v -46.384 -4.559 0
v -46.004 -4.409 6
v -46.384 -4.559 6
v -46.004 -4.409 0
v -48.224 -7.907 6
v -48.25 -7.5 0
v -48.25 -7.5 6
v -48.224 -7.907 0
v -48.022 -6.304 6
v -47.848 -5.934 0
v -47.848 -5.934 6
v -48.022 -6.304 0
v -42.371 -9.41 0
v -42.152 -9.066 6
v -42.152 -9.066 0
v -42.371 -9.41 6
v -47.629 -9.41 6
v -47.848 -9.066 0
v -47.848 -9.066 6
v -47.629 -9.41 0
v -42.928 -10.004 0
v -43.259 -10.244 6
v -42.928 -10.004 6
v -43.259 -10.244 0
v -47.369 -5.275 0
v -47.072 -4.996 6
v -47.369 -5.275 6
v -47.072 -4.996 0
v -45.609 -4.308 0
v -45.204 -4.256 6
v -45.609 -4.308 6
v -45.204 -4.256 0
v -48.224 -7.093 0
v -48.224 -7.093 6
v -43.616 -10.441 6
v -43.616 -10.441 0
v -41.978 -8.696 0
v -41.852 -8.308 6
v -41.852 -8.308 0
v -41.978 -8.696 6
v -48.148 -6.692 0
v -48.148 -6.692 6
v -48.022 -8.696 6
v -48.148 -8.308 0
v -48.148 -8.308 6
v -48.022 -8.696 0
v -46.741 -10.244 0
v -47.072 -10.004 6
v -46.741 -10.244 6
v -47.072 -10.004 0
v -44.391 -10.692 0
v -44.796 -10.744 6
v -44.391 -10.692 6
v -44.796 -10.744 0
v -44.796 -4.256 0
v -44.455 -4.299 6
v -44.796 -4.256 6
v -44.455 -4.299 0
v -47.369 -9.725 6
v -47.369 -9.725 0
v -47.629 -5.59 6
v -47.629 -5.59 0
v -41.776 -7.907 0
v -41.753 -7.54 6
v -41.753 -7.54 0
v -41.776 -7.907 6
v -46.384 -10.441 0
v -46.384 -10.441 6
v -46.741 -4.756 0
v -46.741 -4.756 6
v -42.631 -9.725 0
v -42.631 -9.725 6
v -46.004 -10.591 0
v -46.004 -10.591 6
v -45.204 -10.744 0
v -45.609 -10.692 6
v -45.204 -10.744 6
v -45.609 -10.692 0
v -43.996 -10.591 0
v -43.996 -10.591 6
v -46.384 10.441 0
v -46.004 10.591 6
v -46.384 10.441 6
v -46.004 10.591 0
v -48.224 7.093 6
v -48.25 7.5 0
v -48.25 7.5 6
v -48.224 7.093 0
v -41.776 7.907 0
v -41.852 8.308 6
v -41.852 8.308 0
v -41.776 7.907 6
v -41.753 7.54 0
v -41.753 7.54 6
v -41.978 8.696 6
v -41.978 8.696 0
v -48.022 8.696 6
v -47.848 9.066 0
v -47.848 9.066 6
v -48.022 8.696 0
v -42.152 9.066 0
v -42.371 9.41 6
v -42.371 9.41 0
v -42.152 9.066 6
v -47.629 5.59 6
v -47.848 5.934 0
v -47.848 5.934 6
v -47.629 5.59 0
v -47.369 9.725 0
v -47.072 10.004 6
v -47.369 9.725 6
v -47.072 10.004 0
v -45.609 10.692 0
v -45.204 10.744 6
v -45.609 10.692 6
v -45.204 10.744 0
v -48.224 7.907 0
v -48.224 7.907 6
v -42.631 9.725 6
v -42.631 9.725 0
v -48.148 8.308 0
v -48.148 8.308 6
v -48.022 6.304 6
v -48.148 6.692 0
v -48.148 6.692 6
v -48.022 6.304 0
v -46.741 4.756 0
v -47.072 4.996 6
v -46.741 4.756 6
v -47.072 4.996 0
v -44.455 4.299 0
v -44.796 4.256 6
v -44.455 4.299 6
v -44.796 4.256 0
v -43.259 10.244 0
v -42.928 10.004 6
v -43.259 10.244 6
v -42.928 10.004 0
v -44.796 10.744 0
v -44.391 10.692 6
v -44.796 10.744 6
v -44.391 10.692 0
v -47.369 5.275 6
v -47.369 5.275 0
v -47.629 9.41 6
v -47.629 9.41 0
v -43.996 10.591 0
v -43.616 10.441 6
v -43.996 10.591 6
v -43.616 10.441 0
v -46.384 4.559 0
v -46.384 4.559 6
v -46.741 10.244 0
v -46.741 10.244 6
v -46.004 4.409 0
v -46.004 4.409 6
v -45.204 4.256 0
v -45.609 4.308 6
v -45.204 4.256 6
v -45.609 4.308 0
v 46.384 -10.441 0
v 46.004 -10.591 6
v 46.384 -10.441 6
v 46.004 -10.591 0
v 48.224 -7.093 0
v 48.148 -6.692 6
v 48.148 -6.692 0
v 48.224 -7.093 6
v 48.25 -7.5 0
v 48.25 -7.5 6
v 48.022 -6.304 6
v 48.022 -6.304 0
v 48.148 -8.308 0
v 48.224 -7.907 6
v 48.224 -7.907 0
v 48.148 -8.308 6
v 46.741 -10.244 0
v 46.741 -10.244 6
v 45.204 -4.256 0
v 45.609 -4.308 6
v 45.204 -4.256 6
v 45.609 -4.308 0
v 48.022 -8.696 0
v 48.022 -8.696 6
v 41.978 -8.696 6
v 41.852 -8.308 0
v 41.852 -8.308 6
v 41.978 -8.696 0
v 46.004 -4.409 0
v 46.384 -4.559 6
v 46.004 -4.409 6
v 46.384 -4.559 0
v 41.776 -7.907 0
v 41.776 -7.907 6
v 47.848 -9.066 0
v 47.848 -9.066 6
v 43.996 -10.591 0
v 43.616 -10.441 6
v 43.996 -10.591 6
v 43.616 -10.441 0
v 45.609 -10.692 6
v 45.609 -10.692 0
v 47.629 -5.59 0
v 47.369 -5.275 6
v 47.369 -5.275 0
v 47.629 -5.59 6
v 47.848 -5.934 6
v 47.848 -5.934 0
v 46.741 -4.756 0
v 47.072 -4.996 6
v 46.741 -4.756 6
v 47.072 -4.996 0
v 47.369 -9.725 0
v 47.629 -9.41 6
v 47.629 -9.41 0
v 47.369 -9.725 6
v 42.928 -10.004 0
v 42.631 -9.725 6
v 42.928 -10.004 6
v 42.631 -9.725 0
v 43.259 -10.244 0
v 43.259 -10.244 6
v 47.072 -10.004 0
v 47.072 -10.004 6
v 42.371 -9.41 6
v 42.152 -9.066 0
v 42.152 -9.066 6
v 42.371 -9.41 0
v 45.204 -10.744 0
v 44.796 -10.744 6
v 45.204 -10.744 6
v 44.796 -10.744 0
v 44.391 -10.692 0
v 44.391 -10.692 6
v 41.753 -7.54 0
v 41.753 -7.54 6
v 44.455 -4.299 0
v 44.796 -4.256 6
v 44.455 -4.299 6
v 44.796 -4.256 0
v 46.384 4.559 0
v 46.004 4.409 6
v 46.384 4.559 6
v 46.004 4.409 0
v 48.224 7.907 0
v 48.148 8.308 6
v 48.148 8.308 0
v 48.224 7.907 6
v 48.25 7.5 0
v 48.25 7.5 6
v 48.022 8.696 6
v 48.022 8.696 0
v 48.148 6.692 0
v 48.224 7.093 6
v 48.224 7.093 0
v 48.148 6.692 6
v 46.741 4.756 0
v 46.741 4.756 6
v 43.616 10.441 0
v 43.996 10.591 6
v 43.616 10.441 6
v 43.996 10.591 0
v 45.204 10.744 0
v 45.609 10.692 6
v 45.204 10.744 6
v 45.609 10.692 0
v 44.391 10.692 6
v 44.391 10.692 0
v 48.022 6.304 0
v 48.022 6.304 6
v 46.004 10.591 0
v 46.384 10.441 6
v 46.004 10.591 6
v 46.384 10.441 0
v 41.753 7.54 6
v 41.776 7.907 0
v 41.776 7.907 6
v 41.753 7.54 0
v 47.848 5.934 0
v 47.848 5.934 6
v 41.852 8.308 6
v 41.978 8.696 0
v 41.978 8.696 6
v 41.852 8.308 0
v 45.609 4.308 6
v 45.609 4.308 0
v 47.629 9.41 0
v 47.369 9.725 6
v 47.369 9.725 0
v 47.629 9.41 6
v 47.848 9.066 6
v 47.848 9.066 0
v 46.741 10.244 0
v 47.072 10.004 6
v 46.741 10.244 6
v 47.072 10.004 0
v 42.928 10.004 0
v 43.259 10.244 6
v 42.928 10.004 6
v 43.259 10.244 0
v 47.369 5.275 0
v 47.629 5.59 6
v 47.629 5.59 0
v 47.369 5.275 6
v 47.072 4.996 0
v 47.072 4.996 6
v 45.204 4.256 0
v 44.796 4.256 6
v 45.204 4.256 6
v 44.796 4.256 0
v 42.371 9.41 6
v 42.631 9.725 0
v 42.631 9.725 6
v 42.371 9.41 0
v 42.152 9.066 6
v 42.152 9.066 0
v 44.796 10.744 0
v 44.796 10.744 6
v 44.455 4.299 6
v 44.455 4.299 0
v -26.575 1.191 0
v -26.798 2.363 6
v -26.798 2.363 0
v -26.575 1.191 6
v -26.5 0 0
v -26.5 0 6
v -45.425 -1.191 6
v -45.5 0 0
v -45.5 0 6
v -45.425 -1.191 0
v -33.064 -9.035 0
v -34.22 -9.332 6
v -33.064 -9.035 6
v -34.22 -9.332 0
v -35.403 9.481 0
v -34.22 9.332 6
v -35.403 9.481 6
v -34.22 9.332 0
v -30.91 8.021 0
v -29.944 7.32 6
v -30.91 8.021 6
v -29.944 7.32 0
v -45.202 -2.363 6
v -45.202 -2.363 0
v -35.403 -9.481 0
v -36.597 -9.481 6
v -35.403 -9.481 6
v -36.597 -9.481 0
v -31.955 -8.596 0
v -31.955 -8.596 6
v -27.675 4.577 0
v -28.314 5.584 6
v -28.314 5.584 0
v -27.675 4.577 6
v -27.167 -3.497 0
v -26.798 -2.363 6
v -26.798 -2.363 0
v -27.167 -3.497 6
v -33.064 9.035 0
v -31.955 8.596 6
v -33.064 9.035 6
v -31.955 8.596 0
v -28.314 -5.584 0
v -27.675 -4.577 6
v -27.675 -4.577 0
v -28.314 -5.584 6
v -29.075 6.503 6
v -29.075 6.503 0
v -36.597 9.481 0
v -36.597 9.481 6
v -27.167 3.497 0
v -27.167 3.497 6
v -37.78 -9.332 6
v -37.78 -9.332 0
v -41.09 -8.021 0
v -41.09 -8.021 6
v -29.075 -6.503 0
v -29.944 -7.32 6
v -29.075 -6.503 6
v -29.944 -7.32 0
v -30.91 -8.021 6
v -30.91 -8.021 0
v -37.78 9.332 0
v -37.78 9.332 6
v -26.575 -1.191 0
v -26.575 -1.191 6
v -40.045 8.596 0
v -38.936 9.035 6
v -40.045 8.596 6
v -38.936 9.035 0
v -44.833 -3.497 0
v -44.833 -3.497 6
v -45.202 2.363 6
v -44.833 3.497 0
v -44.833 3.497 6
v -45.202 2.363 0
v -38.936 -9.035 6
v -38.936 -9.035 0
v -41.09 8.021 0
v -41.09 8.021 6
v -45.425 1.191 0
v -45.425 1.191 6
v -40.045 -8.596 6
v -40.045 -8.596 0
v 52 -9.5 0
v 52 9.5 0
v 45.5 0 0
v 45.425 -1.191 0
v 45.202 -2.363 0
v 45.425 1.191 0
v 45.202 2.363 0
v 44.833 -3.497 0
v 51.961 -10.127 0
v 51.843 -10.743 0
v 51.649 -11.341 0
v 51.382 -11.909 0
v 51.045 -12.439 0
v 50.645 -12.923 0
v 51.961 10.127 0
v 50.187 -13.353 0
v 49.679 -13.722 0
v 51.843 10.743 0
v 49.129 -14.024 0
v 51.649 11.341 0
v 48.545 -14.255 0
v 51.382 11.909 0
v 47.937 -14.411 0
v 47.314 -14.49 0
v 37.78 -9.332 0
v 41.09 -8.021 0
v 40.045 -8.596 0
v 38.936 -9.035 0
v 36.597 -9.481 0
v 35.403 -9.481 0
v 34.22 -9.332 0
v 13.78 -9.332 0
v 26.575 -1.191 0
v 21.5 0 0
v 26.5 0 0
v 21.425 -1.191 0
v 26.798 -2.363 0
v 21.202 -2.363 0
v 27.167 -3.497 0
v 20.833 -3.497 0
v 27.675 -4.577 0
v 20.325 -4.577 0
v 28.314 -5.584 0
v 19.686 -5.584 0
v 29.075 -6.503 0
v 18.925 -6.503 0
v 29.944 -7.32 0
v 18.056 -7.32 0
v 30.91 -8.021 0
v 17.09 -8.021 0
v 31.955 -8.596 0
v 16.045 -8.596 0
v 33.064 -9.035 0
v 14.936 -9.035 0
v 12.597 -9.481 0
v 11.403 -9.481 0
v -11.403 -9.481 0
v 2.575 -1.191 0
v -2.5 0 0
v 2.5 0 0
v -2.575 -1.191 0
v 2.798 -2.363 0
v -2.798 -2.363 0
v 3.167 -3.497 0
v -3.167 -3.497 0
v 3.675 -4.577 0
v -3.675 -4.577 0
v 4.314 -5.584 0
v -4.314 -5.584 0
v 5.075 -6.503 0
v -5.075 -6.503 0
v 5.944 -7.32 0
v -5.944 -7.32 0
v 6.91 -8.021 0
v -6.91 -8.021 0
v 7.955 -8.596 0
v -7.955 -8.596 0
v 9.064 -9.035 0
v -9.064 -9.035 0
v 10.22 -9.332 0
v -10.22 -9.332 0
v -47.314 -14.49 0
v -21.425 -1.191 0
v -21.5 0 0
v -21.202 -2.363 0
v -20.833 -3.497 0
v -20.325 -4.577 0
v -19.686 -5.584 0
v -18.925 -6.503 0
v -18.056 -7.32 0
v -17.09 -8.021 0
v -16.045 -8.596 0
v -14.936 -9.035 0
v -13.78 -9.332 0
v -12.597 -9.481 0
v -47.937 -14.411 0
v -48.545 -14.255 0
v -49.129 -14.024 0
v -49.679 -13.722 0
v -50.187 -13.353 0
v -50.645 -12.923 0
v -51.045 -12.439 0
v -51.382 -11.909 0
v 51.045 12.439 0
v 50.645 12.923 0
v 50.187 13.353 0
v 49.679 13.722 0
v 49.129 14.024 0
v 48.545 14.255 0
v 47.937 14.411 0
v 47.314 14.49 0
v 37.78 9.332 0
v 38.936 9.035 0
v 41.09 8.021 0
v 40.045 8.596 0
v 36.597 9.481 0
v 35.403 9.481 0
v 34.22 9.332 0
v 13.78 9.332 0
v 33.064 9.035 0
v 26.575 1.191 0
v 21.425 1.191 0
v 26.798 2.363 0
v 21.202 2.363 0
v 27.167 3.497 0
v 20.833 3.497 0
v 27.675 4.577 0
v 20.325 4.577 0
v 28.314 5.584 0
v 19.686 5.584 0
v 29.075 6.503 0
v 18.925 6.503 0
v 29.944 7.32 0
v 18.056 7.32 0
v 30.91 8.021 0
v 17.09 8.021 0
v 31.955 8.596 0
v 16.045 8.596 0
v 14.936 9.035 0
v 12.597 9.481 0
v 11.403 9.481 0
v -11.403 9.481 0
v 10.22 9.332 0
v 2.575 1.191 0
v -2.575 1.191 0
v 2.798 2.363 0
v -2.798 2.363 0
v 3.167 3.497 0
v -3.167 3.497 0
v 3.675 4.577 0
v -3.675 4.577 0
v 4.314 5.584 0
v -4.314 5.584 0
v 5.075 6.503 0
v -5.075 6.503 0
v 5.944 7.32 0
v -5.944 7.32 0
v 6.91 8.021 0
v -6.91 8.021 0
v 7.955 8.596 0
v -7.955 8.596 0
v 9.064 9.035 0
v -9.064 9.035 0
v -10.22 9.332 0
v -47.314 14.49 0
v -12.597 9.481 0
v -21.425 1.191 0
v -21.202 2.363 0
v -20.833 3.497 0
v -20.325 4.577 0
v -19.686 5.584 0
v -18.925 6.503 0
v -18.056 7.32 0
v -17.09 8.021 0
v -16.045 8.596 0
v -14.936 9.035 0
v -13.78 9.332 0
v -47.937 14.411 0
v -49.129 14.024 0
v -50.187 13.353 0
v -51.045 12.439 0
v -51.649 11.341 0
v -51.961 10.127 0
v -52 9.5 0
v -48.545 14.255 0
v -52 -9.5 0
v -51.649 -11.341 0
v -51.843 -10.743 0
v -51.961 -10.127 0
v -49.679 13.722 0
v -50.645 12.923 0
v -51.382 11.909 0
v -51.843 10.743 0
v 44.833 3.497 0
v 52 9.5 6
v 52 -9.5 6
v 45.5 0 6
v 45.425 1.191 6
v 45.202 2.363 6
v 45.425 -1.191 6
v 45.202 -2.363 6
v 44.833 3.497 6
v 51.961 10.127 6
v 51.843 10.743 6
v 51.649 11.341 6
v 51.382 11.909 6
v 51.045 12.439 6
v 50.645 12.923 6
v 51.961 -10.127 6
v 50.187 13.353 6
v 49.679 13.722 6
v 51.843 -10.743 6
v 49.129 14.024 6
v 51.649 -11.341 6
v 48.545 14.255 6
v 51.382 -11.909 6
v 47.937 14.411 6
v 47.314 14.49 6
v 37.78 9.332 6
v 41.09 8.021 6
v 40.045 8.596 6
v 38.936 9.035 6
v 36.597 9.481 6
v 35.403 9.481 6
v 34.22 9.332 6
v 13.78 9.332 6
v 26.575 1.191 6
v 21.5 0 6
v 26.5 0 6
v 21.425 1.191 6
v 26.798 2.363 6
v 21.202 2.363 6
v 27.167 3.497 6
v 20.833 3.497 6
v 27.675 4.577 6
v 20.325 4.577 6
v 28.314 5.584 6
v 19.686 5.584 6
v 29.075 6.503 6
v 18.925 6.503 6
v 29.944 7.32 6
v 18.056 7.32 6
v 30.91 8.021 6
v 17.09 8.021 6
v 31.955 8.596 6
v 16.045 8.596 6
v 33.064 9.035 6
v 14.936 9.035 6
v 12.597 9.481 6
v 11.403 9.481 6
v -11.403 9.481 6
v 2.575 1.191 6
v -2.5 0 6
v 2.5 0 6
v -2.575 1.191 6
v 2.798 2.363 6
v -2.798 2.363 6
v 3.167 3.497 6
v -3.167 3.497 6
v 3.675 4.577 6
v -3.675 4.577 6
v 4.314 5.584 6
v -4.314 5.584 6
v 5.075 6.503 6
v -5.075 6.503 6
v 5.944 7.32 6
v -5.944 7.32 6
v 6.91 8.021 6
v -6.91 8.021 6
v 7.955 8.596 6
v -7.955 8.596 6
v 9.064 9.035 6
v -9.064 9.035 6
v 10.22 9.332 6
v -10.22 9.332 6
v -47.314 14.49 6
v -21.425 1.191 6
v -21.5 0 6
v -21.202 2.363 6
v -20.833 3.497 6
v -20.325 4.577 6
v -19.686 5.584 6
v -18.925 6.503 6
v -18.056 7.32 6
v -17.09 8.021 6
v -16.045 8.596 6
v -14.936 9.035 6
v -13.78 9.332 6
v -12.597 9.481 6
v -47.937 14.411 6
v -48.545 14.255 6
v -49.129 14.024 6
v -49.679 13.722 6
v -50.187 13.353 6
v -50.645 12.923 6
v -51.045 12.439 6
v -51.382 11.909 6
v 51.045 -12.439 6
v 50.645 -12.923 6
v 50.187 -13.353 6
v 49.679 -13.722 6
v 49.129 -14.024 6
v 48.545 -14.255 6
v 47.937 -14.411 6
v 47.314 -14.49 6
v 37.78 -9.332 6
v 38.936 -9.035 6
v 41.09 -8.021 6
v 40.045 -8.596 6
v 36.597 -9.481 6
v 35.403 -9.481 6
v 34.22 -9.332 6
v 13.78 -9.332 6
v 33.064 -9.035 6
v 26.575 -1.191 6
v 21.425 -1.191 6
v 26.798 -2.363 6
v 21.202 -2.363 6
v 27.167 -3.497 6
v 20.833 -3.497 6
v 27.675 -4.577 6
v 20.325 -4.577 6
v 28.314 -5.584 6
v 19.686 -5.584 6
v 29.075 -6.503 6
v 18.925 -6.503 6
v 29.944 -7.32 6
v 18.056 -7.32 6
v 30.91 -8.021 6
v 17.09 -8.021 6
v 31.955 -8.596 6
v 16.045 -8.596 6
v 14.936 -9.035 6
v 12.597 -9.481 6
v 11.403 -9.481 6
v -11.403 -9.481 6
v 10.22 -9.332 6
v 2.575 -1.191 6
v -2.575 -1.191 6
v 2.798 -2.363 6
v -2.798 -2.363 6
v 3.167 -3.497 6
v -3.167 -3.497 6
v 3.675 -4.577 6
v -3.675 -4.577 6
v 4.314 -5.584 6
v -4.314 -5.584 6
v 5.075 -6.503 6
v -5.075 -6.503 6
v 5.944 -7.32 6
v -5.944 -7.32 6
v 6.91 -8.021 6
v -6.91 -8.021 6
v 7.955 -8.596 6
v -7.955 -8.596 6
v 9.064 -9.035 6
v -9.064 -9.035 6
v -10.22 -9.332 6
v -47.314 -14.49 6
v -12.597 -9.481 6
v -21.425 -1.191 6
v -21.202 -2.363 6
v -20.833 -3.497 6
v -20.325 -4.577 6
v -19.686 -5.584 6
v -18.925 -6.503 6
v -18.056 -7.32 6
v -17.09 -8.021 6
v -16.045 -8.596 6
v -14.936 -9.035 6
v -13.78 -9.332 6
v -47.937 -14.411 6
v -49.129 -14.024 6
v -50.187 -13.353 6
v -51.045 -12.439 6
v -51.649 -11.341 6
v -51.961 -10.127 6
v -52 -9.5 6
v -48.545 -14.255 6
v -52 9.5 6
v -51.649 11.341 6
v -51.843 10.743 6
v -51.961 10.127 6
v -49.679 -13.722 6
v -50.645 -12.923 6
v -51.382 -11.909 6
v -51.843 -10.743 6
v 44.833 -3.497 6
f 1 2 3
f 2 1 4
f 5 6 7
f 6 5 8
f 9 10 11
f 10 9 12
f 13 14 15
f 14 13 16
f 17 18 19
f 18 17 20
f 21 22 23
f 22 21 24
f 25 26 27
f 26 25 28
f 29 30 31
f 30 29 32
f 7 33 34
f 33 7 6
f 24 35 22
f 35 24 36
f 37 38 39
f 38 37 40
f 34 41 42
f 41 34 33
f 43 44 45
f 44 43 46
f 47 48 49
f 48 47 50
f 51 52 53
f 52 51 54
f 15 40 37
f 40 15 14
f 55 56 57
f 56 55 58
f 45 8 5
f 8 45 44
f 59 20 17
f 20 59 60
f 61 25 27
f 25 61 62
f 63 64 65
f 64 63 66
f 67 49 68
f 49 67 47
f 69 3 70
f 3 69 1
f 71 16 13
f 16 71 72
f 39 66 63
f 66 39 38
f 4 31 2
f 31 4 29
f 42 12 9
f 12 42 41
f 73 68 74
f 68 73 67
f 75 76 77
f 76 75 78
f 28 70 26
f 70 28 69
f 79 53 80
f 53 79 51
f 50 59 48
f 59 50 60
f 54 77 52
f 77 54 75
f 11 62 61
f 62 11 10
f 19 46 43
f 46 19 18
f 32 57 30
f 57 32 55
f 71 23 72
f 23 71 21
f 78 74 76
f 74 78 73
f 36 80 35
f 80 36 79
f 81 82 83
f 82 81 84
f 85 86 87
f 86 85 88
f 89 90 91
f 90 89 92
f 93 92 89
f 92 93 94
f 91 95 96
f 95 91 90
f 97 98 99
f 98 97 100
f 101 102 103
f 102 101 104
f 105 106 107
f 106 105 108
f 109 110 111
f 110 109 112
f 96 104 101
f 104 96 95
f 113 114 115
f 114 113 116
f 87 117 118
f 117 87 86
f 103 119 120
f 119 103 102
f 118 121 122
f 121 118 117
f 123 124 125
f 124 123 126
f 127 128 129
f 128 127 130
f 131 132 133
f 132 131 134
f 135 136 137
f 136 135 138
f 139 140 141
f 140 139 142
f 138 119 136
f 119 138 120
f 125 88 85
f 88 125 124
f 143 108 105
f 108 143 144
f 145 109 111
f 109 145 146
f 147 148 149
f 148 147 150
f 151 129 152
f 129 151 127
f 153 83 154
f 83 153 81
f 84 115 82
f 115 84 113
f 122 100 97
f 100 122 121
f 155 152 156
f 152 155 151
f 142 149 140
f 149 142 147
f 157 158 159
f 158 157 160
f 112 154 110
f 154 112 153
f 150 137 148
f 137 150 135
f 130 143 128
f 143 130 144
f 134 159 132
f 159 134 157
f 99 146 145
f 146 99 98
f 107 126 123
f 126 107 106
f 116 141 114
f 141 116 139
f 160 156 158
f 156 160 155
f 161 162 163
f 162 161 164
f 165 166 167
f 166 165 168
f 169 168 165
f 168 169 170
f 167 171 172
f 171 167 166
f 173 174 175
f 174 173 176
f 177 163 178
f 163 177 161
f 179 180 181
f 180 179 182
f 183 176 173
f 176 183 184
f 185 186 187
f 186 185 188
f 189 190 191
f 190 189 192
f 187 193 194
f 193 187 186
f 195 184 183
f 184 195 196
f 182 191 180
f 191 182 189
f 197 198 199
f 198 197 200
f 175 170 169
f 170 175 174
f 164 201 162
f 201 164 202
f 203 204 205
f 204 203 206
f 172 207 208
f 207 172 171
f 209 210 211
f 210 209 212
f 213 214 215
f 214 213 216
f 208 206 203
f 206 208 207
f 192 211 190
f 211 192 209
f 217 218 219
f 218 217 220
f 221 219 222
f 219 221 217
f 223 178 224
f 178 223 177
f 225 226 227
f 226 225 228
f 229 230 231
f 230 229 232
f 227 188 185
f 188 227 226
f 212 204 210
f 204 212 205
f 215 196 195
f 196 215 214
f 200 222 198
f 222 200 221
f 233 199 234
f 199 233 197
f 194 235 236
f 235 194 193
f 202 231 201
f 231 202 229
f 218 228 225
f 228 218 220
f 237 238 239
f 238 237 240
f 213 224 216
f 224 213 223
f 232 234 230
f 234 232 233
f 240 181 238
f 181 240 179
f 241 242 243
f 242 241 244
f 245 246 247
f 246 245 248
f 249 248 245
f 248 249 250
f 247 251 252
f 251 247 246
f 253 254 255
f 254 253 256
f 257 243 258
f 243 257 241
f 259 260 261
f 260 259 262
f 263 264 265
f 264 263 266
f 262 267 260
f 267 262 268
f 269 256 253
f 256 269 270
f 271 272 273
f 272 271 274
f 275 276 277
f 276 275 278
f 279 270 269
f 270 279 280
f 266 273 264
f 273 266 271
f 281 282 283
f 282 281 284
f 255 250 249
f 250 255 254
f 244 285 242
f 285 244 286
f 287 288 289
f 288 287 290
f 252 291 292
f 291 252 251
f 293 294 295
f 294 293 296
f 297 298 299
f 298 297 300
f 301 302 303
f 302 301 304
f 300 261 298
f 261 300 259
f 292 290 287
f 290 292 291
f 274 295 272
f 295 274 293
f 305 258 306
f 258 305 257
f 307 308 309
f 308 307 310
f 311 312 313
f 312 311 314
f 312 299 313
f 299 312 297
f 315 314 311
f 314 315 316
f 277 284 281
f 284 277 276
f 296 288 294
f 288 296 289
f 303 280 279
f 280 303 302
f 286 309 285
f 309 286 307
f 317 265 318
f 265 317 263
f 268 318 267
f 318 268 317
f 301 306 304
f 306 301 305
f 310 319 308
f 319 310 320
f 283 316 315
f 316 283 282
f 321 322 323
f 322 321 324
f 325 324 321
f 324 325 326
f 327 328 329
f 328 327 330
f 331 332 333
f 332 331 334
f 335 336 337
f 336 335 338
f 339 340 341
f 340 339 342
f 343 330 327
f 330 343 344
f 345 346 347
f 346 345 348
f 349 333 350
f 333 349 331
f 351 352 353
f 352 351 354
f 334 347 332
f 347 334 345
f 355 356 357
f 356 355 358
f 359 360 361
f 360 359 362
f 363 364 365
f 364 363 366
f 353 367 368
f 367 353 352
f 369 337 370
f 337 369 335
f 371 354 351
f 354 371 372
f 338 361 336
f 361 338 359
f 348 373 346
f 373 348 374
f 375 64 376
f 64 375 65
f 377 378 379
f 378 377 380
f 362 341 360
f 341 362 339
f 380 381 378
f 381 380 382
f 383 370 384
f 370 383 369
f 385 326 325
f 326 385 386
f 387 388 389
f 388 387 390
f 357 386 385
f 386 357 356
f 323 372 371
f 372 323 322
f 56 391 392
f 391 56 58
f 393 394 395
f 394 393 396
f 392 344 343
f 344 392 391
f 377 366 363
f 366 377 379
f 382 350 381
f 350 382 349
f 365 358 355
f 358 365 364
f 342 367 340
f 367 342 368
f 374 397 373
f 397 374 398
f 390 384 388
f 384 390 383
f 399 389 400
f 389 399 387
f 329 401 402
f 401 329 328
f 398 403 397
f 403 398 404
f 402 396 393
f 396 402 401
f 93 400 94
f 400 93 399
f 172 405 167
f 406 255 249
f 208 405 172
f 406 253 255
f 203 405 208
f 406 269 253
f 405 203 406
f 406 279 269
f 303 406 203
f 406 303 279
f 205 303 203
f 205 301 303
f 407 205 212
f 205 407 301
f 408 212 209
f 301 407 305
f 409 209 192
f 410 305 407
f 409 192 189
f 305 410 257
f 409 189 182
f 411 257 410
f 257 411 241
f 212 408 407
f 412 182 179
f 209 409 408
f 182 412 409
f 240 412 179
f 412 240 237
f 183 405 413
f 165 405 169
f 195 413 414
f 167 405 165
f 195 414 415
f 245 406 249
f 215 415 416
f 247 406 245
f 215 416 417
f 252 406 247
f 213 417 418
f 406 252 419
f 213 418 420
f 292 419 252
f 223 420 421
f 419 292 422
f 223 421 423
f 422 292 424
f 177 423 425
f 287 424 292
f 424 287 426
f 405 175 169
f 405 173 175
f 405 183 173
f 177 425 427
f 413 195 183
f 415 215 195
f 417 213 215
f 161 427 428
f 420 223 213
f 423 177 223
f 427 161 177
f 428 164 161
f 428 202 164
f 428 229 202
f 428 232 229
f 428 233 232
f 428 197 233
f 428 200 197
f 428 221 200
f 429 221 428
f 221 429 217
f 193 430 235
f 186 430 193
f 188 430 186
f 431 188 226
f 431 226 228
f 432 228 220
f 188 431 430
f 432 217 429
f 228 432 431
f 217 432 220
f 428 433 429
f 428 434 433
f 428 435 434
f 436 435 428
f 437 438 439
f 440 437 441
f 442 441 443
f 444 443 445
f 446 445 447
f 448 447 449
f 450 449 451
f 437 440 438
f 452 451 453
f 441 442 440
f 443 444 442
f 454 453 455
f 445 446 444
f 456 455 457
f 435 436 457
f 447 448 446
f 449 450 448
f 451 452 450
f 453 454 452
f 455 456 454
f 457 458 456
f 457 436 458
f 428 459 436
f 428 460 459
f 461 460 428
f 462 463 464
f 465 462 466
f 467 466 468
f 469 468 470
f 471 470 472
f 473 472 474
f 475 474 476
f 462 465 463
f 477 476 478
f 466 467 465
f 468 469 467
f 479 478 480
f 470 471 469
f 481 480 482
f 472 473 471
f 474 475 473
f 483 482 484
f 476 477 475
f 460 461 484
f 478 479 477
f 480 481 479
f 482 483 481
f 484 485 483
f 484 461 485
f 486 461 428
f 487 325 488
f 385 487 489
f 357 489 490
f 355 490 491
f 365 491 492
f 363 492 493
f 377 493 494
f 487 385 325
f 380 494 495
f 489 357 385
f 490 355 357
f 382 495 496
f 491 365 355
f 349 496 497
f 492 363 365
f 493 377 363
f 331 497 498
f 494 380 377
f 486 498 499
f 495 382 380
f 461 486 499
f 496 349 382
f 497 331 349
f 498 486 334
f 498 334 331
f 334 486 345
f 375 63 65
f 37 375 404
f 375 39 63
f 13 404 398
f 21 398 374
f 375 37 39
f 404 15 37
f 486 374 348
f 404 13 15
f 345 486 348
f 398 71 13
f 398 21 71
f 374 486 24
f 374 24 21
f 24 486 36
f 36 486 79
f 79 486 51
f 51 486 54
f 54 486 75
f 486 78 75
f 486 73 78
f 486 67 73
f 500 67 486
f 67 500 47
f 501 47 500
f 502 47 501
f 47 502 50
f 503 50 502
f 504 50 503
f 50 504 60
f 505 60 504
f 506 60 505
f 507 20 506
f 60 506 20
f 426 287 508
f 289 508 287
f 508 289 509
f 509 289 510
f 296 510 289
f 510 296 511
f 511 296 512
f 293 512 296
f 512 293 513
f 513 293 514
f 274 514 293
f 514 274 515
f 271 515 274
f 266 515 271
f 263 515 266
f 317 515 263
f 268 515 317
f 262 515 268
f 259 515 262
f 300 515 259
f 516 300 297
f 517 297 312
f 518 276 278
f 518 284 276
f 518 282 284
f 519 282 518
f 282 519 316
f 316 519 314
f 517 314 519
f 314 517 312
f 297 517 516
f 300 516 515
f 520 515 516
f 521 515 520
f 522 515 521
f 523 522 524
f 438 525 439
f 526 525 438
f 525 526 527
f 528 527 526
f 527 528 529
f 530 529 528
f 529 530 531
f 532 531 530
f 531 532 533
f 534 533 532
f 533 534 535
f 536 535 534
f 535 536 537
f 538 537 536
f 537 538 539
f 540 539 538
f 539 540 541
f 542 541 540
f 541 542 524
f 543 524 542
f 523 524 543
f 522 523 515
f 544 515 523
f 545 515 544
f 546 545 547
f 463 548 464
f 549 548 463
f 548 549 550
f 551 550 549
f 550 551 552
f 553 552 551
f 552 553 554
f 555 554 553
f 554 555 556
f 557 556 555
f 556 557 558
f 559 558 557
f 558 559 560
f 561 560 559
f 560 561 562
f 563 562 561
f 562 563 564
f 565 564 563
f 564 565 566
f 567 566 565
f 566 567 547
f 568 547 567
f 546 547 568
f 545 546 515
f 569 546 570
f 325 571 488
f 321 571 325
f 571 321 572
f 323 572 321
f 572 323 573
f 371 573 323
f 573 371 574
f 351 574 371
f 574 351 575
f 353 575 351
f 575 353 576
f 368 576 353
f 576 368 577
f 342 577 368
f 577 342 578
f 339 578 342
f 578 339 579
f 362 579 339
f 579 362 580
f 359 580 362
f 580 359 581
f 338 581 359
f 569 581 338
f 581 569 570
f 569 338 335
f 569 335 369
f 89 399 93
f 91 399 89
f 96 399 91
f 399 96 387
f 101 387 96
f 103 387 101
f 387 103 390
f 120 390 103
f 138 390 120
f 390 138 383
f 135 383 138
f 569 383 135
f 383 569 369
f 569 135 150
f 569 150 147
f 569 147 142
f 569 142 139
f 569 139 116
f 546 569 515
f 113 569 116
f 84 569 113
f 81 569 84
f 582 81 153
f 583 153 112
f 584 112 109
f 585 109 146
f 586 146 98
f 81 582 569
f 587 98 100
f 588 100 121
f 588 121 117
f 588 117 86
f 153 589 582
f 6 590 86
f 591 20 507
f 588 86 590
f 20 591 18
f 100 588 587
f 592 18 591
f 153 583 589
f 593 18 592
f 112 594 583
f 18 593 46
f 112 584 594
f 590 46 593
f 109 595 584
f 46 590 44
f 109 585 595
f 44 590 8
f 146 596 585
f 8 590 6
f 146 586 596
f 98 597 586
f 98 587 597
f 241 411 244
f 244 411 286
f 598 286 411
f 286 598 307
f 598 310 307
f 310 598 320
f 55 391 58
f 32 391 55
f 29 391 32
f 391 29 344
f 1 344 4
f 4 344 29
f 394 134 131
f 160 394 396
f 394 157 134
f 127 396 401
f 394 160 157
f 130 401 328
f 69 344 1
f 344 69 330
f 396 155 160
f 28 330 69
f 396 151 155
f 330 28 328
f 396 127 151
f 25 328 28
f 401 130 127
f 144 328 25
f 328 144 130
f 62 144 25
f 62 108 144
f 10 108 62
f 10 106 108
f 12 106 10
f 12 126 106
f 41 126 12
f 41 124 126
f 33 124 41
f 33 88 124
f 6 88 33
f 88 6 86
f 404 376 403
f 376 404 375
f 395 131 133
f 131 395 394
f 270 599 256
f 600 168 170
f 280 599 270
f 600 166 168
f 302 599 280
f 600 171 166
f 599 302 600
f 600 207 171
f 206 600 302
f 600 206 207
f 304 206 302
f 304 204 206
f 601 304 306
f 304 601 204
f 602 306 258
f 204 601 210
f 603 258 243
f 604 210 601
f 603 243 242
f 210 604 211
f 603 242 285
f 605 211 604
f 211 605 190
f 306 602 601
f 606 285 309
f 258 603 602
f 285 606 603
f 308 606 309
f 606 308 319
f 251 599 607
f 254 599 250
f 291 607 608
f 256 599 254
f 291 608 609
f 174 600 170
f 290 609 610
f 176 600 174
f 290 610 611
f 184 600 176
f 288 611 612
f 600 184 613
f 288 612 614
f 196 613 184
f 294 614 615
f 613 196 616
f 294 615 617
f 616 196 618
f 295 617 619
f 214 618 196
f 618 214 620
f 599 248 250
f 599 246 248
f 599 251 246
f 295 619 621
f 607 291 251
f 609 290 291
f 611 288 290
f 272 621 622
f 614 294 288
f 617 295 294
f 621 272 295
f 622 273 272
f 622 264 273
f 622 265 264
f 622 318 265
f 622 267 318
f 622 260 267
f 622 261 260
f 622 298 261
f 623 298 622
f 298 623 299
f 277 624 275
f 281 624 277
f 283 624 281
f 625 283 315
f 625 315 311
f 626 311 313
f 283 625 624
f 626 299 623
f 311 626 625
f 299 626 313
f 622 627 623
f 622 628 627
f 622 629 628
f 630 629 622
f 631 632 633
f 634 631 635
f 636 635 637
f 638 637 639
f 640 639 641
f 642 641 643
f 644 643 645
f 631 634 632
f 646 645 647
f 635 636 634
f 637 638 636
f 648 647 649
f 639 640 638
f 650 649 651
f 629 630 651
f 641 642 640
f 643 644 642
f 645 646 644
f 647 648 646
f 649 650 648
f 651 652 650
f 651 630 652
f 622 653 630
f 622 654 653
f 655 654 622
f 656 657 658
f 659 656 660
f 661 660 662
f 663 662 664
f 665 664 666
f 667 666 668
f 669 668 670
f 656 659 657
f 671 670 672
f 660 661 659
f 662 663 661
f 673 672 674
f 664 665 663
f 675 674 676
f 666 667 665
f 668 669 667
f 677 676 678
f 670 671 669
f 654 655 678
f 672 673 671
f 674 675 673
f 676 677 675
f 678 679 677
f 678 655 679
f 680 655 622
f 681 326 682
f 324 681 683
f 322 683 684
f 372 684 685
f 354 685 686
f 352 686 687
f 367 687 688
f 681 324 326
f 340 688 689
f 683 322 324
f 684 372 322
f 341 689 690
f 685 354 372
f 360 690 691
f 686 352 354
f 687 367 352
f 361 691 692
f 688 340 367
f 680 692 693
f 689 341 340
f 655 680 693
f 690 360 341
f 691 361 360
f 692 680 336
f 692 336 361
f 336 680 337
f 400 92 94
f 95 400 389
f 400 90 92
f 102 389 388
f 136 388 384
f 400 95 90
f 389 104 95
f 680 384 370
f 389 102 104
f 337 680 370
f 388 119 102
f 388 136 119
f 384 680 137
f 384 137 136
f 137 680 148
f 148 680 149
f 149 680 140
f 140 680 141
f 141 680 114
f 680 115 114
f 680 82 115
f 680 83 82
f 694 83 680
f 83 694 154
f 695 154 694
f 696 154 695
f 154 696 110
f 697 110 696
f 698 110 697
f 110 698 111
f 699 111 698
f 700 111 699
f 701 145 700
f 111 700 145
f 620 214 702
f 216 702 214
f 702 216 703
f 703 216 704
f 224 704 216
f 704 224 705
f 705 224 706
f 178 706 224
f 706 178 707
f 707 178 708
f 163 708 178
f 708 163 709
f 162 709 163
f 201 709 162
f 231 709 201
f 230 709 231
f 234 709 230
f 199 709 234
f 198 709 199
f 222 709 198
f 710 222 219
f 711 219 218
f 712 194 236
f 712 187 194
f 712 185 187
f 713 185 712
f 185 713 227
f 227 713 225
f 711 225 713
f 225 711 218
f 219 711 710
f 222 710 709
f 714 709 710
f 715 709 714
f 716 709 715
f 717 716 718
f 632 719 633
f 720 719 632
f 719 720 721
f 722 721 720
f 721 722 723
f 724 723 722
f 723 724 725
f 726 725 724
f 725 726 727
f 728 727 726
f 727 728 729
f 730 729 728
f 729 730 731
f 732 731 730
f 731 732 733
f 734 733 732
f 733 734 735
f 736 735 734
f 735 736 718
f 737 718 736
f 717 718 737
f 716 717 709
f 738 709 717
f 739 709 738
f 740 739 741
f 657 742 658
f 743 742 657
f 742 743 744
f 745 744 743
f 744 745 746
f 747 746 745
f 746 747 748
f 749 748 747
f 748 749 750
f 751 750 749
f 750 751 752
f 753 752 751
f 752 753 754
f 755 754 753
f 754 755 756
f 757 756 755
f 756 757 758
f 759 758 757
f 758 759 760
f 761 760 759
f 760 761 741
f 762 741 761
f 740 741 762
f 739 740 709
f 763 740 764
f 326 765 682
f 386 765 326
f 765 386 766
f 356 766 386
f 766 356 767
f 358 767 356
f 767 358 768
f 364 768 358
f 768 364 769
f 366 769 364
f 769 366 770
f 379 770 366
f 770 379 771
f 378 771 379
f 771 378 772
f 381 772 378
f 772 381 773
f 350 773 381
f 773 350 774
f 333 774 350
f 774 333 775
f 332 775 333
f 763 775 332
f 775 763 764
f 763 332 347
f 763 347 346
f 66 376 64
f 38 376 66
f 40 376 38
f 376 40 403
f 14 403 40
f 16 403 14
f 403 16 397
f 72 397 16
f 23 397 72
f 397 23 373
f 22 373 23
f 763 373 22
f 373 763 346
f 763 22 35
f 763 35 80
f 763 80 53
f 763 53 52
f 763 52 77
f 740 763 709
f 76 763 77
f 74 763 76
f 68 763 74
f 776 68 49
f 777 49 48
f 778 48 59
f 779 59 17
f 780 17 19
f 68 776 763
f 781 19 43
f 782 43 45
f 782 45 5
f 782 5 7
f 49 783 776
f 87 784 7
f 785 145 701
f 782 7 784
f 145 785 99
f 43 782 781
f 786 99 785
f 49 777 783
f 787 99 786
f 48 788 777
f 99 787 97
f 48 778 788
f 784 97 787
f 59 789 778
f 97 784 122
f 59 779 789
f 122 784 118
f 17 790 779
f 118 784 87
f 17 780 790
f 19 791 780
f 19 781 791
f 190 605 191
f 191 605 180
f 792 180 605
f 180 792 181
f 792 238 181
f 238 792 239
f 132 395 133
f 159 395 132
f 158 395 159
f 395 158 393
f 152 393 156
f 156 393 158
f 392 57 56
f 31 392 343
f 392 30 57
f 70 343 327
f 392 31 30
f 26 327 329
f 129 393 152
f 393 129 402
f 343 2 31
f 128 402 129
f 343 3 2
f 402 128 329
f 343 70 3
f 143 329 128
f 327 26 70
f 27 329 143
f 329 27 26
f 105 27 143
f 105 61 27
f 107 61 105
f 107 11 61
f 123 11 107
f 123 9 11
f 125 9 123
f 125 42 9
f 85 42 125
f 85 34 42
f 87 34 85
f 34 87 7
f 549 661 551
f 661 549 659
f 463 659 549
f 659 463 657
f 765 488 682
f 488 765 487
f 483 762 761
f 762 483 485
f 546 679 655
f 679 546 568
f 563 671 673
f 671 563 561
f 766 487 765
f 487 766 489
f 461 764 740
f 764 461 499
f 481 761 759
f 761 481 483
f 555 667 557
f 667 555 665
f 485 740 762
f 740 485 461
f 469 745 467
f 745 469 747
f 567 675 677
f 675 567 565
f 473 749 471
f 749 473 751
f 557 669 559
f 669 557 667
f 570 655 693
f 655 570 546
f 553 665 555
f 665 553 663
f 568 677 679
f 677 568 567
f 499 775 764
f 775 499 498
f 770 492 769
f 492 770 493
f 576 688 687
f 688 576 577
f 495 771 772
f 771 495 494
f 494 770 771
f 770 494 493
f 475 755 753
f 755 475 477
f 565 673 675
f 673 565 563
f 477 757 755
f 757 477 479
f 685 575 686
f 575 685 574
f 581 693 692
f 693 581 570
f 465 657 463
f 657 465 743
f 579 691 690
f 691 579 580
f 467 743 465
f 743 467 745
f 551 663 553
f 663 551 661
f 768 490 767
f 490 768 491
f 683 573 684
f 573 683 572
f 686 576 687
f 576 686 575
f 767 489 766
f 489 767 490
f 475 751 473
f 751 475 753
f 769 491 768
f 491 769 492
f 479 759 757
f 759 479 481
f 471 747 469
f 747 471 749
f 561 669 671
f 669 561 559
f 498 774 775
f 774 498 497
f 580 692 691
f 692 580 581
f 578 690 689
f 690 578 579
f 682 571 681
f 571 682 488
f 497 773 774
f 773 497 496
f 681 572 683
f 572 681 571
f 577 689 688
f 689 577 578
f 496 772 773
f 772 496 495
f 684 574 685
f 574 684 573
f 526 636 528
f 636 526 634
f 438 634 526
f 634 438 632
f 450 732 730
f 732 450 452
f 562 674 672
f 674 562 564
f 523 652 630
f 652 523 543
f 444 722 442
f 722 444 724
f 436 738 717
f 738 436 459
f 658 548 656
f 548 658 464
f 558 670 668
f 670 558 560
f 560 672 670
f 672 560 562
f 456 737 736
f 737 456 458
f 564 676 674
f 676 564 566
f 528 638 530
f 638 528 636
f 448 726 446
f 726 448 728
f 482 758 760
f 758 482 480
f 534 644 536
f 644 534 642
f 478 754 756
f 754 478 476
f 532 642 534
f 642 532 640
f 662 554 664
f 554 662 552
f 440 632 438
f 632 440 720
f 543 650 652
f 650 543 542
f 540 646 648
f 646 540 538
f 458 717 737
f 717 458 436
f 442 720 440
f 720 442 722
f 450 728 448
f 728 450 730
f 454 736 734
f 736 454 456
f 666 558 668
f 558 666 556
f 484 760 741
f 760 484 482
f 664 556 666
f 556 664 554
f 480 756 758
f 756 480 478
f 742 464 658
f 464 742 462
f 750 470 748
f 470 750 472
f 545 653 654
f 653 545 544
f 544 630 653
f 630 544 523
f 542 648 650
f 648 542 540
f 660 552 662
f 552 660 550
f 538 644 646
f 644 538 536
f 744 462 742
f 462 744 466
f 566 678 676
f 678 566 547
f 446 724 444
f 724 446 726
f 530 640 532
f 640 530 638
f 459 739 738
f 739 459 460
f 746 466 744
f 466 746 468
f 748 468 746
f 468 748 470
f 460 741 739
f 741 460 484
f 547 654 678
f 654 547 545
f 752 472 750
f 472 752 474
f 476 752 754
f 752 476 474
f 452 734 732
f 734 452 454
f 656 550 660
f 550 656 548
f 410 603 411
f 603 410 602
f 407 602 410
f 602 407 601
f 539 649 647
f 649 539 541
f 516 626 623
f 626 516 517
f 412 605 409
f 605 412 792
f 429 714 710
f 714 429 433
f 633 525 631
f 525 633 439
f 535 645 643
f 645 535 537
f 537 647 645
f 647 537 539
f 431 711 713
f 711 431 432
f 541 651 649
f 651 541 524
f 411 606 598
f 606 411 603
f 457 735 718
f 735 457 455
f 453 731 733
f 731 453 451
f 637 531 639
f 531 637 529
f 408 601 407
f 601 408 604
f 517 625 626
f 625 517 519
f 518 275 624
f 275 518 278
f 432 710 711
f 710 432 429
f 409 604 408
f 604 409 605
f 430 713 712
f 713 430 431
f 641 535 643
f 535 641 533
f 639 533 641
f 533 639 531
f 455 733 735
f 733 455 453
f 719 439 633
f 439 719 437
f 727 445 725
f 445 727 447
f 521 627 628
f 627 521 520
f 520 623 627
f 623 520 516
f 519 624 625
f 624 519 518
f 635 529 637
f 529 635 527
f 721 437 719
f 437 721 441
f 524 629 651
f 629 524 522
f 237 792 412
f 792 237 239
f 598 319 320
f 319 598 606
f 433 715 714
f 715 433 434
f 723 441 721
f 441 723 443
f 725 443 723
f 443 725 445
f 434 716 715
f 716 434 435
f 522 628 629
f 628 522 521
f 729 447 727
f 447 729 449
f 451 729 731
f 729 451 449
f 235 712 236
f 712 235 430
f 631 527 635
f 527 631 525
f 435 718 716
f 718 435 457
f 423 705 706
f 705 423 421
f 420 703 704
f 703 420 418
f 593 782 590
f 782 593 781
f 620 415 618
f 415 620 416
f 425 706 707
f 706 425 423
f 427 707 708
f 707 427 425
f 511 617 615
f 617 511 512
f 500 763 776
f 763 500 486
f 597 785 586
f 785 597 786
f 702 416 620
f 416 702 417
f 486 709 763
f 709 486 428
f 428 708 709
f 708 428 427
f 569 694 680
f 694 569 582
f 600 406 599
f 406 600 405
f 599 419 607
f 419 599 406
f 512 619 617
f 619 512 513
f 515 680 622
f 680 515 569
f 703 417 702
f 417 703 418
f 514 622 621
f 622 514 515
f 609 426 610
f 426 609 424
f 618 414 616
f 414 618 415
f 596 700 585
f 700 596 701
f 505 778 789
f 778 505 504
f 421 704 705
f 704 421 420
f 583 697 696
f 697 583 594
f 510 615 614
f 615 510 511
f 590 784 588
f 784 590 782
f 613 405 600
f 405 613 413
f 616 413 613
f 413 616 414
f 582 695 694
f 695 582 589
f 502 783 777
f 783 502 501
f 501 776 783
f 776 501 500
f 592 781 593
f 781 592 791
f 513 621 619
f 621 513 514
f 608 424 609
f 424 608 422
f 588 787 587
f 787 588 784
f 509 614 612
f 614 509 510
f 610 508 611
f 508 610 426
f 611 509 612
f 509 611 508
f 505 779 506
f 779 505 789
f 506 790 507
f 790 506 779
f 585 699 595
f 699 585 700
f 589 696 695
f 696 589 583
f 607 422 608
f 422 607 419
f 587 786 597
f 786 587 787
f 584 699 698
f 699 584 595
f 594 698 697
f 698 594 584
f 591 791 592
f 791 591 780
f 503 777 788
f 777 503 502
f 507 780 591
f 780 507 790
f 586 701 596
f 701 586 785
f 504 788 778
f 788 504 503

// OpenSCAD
$fn = 50;

difference() {
	union() {
		hull() {
			translate(v = [-47.0, 9.5, 0]) {
				cylinder(h = 6, r = 5);
			}
			translate(v = [47.0, 9.5, 0]) {
				cylinder(h = 6, r = 5);
			}
			translate(v = [-47.0, -9.5, 0]) {
				cylinder(h = 6, r = 5);
			}
			translate(v = [47.0, -9.5, 0]) {
				cylinder(h = 6, r = 5);
			}
		}
	}
	union() {
		translate(v = [-45.0, -7.5, -100.0]) {
			cylinder(h = 200, r = 3.25);
		}
		translate(v = [-45.0, 7.5, -100.0]) {
			cylinder(h = 200, r = 3.25);
		}
		translate(v = [45.0, -7.5, -100.0]) {
			cylinder(h = 200, r = 3.25);
		}
		translate(v = [45.0, 7.5, -100.0]) {
			cylinder(h = 200, r = 3.25);
		}
		translate(v = [-45.0, -7.5, -100.0]) {
			cylinder(h = 200, r = 1.8);
		}
		translate(v = [-45.0, 7.5, -100.0]) {
			cylinder(h = 200, r = 1.8);
		}
		translate(v = [45.0, -7.5, -100.0]) {
			cylinder(h = 200, r = 1.8);
		}
		translate(v = [45.0, 7.5, -100.0]) {
			cylinder(h = 200, r = 1.8);
		}
		translate(v = [-36.0, 0, 0.0]) {
			cylinder(h = 6, r = 9.5);
		}
		translate(v = [-12.0, 0, 0.0]) {
			cylinder(h = 6, r = 9.5);
		}
		translate(v = [12.0, 0, 0.0]) {
			cylinder(h = 6, r = 9.5);
		}
		translate(v = [36.0, 0, 0.0]) {
			cylinder(h = 6, r = 9.5);
		}
	}
}
